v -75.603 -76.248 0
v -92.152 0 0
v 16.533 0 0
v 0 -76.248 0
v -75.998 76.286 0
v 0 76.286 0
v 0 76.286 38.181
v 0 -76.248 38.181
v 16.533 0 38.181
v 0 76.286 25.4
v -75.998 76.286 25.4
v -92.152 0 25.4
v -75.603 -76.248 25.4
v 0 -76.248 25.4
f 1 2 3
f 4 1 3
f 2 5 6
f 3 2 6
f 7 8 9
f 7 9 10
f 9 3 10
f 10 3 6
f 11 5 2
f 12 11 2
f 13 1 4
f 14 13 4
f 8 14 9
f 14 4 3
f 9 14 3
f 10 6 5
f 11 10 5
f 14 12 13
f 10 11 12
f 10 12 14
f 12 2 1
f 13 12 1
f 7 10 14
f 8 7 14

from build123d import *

# Parameters (mm, degrees)
F1_DEPTH = 25.4
F3_DEPTH = 12.780771


with BuildPart() as f1:
    # F0 (on Top) → F1 (new body)
    with BuildSketch(Plane.XY):
        Polygon((16.532764, 0), (0, 76.285757), (-75.997785, 76.285757), (-92.152342, 0), (-75.602874, -76.248273), (0, -76.248273), align=None)
    extrude(amount=F1_DEPTH)

    # F2 (on face) → F3 (join)
    with BuildSketch(Plane.XY.offset(25.4)):
        Polygon((0, 0), (0, -76.248273), (16.532764, 0), (0, 76.285757), align=None)
    extrude(amount=F3_DEPTH)


solid = f1.part
